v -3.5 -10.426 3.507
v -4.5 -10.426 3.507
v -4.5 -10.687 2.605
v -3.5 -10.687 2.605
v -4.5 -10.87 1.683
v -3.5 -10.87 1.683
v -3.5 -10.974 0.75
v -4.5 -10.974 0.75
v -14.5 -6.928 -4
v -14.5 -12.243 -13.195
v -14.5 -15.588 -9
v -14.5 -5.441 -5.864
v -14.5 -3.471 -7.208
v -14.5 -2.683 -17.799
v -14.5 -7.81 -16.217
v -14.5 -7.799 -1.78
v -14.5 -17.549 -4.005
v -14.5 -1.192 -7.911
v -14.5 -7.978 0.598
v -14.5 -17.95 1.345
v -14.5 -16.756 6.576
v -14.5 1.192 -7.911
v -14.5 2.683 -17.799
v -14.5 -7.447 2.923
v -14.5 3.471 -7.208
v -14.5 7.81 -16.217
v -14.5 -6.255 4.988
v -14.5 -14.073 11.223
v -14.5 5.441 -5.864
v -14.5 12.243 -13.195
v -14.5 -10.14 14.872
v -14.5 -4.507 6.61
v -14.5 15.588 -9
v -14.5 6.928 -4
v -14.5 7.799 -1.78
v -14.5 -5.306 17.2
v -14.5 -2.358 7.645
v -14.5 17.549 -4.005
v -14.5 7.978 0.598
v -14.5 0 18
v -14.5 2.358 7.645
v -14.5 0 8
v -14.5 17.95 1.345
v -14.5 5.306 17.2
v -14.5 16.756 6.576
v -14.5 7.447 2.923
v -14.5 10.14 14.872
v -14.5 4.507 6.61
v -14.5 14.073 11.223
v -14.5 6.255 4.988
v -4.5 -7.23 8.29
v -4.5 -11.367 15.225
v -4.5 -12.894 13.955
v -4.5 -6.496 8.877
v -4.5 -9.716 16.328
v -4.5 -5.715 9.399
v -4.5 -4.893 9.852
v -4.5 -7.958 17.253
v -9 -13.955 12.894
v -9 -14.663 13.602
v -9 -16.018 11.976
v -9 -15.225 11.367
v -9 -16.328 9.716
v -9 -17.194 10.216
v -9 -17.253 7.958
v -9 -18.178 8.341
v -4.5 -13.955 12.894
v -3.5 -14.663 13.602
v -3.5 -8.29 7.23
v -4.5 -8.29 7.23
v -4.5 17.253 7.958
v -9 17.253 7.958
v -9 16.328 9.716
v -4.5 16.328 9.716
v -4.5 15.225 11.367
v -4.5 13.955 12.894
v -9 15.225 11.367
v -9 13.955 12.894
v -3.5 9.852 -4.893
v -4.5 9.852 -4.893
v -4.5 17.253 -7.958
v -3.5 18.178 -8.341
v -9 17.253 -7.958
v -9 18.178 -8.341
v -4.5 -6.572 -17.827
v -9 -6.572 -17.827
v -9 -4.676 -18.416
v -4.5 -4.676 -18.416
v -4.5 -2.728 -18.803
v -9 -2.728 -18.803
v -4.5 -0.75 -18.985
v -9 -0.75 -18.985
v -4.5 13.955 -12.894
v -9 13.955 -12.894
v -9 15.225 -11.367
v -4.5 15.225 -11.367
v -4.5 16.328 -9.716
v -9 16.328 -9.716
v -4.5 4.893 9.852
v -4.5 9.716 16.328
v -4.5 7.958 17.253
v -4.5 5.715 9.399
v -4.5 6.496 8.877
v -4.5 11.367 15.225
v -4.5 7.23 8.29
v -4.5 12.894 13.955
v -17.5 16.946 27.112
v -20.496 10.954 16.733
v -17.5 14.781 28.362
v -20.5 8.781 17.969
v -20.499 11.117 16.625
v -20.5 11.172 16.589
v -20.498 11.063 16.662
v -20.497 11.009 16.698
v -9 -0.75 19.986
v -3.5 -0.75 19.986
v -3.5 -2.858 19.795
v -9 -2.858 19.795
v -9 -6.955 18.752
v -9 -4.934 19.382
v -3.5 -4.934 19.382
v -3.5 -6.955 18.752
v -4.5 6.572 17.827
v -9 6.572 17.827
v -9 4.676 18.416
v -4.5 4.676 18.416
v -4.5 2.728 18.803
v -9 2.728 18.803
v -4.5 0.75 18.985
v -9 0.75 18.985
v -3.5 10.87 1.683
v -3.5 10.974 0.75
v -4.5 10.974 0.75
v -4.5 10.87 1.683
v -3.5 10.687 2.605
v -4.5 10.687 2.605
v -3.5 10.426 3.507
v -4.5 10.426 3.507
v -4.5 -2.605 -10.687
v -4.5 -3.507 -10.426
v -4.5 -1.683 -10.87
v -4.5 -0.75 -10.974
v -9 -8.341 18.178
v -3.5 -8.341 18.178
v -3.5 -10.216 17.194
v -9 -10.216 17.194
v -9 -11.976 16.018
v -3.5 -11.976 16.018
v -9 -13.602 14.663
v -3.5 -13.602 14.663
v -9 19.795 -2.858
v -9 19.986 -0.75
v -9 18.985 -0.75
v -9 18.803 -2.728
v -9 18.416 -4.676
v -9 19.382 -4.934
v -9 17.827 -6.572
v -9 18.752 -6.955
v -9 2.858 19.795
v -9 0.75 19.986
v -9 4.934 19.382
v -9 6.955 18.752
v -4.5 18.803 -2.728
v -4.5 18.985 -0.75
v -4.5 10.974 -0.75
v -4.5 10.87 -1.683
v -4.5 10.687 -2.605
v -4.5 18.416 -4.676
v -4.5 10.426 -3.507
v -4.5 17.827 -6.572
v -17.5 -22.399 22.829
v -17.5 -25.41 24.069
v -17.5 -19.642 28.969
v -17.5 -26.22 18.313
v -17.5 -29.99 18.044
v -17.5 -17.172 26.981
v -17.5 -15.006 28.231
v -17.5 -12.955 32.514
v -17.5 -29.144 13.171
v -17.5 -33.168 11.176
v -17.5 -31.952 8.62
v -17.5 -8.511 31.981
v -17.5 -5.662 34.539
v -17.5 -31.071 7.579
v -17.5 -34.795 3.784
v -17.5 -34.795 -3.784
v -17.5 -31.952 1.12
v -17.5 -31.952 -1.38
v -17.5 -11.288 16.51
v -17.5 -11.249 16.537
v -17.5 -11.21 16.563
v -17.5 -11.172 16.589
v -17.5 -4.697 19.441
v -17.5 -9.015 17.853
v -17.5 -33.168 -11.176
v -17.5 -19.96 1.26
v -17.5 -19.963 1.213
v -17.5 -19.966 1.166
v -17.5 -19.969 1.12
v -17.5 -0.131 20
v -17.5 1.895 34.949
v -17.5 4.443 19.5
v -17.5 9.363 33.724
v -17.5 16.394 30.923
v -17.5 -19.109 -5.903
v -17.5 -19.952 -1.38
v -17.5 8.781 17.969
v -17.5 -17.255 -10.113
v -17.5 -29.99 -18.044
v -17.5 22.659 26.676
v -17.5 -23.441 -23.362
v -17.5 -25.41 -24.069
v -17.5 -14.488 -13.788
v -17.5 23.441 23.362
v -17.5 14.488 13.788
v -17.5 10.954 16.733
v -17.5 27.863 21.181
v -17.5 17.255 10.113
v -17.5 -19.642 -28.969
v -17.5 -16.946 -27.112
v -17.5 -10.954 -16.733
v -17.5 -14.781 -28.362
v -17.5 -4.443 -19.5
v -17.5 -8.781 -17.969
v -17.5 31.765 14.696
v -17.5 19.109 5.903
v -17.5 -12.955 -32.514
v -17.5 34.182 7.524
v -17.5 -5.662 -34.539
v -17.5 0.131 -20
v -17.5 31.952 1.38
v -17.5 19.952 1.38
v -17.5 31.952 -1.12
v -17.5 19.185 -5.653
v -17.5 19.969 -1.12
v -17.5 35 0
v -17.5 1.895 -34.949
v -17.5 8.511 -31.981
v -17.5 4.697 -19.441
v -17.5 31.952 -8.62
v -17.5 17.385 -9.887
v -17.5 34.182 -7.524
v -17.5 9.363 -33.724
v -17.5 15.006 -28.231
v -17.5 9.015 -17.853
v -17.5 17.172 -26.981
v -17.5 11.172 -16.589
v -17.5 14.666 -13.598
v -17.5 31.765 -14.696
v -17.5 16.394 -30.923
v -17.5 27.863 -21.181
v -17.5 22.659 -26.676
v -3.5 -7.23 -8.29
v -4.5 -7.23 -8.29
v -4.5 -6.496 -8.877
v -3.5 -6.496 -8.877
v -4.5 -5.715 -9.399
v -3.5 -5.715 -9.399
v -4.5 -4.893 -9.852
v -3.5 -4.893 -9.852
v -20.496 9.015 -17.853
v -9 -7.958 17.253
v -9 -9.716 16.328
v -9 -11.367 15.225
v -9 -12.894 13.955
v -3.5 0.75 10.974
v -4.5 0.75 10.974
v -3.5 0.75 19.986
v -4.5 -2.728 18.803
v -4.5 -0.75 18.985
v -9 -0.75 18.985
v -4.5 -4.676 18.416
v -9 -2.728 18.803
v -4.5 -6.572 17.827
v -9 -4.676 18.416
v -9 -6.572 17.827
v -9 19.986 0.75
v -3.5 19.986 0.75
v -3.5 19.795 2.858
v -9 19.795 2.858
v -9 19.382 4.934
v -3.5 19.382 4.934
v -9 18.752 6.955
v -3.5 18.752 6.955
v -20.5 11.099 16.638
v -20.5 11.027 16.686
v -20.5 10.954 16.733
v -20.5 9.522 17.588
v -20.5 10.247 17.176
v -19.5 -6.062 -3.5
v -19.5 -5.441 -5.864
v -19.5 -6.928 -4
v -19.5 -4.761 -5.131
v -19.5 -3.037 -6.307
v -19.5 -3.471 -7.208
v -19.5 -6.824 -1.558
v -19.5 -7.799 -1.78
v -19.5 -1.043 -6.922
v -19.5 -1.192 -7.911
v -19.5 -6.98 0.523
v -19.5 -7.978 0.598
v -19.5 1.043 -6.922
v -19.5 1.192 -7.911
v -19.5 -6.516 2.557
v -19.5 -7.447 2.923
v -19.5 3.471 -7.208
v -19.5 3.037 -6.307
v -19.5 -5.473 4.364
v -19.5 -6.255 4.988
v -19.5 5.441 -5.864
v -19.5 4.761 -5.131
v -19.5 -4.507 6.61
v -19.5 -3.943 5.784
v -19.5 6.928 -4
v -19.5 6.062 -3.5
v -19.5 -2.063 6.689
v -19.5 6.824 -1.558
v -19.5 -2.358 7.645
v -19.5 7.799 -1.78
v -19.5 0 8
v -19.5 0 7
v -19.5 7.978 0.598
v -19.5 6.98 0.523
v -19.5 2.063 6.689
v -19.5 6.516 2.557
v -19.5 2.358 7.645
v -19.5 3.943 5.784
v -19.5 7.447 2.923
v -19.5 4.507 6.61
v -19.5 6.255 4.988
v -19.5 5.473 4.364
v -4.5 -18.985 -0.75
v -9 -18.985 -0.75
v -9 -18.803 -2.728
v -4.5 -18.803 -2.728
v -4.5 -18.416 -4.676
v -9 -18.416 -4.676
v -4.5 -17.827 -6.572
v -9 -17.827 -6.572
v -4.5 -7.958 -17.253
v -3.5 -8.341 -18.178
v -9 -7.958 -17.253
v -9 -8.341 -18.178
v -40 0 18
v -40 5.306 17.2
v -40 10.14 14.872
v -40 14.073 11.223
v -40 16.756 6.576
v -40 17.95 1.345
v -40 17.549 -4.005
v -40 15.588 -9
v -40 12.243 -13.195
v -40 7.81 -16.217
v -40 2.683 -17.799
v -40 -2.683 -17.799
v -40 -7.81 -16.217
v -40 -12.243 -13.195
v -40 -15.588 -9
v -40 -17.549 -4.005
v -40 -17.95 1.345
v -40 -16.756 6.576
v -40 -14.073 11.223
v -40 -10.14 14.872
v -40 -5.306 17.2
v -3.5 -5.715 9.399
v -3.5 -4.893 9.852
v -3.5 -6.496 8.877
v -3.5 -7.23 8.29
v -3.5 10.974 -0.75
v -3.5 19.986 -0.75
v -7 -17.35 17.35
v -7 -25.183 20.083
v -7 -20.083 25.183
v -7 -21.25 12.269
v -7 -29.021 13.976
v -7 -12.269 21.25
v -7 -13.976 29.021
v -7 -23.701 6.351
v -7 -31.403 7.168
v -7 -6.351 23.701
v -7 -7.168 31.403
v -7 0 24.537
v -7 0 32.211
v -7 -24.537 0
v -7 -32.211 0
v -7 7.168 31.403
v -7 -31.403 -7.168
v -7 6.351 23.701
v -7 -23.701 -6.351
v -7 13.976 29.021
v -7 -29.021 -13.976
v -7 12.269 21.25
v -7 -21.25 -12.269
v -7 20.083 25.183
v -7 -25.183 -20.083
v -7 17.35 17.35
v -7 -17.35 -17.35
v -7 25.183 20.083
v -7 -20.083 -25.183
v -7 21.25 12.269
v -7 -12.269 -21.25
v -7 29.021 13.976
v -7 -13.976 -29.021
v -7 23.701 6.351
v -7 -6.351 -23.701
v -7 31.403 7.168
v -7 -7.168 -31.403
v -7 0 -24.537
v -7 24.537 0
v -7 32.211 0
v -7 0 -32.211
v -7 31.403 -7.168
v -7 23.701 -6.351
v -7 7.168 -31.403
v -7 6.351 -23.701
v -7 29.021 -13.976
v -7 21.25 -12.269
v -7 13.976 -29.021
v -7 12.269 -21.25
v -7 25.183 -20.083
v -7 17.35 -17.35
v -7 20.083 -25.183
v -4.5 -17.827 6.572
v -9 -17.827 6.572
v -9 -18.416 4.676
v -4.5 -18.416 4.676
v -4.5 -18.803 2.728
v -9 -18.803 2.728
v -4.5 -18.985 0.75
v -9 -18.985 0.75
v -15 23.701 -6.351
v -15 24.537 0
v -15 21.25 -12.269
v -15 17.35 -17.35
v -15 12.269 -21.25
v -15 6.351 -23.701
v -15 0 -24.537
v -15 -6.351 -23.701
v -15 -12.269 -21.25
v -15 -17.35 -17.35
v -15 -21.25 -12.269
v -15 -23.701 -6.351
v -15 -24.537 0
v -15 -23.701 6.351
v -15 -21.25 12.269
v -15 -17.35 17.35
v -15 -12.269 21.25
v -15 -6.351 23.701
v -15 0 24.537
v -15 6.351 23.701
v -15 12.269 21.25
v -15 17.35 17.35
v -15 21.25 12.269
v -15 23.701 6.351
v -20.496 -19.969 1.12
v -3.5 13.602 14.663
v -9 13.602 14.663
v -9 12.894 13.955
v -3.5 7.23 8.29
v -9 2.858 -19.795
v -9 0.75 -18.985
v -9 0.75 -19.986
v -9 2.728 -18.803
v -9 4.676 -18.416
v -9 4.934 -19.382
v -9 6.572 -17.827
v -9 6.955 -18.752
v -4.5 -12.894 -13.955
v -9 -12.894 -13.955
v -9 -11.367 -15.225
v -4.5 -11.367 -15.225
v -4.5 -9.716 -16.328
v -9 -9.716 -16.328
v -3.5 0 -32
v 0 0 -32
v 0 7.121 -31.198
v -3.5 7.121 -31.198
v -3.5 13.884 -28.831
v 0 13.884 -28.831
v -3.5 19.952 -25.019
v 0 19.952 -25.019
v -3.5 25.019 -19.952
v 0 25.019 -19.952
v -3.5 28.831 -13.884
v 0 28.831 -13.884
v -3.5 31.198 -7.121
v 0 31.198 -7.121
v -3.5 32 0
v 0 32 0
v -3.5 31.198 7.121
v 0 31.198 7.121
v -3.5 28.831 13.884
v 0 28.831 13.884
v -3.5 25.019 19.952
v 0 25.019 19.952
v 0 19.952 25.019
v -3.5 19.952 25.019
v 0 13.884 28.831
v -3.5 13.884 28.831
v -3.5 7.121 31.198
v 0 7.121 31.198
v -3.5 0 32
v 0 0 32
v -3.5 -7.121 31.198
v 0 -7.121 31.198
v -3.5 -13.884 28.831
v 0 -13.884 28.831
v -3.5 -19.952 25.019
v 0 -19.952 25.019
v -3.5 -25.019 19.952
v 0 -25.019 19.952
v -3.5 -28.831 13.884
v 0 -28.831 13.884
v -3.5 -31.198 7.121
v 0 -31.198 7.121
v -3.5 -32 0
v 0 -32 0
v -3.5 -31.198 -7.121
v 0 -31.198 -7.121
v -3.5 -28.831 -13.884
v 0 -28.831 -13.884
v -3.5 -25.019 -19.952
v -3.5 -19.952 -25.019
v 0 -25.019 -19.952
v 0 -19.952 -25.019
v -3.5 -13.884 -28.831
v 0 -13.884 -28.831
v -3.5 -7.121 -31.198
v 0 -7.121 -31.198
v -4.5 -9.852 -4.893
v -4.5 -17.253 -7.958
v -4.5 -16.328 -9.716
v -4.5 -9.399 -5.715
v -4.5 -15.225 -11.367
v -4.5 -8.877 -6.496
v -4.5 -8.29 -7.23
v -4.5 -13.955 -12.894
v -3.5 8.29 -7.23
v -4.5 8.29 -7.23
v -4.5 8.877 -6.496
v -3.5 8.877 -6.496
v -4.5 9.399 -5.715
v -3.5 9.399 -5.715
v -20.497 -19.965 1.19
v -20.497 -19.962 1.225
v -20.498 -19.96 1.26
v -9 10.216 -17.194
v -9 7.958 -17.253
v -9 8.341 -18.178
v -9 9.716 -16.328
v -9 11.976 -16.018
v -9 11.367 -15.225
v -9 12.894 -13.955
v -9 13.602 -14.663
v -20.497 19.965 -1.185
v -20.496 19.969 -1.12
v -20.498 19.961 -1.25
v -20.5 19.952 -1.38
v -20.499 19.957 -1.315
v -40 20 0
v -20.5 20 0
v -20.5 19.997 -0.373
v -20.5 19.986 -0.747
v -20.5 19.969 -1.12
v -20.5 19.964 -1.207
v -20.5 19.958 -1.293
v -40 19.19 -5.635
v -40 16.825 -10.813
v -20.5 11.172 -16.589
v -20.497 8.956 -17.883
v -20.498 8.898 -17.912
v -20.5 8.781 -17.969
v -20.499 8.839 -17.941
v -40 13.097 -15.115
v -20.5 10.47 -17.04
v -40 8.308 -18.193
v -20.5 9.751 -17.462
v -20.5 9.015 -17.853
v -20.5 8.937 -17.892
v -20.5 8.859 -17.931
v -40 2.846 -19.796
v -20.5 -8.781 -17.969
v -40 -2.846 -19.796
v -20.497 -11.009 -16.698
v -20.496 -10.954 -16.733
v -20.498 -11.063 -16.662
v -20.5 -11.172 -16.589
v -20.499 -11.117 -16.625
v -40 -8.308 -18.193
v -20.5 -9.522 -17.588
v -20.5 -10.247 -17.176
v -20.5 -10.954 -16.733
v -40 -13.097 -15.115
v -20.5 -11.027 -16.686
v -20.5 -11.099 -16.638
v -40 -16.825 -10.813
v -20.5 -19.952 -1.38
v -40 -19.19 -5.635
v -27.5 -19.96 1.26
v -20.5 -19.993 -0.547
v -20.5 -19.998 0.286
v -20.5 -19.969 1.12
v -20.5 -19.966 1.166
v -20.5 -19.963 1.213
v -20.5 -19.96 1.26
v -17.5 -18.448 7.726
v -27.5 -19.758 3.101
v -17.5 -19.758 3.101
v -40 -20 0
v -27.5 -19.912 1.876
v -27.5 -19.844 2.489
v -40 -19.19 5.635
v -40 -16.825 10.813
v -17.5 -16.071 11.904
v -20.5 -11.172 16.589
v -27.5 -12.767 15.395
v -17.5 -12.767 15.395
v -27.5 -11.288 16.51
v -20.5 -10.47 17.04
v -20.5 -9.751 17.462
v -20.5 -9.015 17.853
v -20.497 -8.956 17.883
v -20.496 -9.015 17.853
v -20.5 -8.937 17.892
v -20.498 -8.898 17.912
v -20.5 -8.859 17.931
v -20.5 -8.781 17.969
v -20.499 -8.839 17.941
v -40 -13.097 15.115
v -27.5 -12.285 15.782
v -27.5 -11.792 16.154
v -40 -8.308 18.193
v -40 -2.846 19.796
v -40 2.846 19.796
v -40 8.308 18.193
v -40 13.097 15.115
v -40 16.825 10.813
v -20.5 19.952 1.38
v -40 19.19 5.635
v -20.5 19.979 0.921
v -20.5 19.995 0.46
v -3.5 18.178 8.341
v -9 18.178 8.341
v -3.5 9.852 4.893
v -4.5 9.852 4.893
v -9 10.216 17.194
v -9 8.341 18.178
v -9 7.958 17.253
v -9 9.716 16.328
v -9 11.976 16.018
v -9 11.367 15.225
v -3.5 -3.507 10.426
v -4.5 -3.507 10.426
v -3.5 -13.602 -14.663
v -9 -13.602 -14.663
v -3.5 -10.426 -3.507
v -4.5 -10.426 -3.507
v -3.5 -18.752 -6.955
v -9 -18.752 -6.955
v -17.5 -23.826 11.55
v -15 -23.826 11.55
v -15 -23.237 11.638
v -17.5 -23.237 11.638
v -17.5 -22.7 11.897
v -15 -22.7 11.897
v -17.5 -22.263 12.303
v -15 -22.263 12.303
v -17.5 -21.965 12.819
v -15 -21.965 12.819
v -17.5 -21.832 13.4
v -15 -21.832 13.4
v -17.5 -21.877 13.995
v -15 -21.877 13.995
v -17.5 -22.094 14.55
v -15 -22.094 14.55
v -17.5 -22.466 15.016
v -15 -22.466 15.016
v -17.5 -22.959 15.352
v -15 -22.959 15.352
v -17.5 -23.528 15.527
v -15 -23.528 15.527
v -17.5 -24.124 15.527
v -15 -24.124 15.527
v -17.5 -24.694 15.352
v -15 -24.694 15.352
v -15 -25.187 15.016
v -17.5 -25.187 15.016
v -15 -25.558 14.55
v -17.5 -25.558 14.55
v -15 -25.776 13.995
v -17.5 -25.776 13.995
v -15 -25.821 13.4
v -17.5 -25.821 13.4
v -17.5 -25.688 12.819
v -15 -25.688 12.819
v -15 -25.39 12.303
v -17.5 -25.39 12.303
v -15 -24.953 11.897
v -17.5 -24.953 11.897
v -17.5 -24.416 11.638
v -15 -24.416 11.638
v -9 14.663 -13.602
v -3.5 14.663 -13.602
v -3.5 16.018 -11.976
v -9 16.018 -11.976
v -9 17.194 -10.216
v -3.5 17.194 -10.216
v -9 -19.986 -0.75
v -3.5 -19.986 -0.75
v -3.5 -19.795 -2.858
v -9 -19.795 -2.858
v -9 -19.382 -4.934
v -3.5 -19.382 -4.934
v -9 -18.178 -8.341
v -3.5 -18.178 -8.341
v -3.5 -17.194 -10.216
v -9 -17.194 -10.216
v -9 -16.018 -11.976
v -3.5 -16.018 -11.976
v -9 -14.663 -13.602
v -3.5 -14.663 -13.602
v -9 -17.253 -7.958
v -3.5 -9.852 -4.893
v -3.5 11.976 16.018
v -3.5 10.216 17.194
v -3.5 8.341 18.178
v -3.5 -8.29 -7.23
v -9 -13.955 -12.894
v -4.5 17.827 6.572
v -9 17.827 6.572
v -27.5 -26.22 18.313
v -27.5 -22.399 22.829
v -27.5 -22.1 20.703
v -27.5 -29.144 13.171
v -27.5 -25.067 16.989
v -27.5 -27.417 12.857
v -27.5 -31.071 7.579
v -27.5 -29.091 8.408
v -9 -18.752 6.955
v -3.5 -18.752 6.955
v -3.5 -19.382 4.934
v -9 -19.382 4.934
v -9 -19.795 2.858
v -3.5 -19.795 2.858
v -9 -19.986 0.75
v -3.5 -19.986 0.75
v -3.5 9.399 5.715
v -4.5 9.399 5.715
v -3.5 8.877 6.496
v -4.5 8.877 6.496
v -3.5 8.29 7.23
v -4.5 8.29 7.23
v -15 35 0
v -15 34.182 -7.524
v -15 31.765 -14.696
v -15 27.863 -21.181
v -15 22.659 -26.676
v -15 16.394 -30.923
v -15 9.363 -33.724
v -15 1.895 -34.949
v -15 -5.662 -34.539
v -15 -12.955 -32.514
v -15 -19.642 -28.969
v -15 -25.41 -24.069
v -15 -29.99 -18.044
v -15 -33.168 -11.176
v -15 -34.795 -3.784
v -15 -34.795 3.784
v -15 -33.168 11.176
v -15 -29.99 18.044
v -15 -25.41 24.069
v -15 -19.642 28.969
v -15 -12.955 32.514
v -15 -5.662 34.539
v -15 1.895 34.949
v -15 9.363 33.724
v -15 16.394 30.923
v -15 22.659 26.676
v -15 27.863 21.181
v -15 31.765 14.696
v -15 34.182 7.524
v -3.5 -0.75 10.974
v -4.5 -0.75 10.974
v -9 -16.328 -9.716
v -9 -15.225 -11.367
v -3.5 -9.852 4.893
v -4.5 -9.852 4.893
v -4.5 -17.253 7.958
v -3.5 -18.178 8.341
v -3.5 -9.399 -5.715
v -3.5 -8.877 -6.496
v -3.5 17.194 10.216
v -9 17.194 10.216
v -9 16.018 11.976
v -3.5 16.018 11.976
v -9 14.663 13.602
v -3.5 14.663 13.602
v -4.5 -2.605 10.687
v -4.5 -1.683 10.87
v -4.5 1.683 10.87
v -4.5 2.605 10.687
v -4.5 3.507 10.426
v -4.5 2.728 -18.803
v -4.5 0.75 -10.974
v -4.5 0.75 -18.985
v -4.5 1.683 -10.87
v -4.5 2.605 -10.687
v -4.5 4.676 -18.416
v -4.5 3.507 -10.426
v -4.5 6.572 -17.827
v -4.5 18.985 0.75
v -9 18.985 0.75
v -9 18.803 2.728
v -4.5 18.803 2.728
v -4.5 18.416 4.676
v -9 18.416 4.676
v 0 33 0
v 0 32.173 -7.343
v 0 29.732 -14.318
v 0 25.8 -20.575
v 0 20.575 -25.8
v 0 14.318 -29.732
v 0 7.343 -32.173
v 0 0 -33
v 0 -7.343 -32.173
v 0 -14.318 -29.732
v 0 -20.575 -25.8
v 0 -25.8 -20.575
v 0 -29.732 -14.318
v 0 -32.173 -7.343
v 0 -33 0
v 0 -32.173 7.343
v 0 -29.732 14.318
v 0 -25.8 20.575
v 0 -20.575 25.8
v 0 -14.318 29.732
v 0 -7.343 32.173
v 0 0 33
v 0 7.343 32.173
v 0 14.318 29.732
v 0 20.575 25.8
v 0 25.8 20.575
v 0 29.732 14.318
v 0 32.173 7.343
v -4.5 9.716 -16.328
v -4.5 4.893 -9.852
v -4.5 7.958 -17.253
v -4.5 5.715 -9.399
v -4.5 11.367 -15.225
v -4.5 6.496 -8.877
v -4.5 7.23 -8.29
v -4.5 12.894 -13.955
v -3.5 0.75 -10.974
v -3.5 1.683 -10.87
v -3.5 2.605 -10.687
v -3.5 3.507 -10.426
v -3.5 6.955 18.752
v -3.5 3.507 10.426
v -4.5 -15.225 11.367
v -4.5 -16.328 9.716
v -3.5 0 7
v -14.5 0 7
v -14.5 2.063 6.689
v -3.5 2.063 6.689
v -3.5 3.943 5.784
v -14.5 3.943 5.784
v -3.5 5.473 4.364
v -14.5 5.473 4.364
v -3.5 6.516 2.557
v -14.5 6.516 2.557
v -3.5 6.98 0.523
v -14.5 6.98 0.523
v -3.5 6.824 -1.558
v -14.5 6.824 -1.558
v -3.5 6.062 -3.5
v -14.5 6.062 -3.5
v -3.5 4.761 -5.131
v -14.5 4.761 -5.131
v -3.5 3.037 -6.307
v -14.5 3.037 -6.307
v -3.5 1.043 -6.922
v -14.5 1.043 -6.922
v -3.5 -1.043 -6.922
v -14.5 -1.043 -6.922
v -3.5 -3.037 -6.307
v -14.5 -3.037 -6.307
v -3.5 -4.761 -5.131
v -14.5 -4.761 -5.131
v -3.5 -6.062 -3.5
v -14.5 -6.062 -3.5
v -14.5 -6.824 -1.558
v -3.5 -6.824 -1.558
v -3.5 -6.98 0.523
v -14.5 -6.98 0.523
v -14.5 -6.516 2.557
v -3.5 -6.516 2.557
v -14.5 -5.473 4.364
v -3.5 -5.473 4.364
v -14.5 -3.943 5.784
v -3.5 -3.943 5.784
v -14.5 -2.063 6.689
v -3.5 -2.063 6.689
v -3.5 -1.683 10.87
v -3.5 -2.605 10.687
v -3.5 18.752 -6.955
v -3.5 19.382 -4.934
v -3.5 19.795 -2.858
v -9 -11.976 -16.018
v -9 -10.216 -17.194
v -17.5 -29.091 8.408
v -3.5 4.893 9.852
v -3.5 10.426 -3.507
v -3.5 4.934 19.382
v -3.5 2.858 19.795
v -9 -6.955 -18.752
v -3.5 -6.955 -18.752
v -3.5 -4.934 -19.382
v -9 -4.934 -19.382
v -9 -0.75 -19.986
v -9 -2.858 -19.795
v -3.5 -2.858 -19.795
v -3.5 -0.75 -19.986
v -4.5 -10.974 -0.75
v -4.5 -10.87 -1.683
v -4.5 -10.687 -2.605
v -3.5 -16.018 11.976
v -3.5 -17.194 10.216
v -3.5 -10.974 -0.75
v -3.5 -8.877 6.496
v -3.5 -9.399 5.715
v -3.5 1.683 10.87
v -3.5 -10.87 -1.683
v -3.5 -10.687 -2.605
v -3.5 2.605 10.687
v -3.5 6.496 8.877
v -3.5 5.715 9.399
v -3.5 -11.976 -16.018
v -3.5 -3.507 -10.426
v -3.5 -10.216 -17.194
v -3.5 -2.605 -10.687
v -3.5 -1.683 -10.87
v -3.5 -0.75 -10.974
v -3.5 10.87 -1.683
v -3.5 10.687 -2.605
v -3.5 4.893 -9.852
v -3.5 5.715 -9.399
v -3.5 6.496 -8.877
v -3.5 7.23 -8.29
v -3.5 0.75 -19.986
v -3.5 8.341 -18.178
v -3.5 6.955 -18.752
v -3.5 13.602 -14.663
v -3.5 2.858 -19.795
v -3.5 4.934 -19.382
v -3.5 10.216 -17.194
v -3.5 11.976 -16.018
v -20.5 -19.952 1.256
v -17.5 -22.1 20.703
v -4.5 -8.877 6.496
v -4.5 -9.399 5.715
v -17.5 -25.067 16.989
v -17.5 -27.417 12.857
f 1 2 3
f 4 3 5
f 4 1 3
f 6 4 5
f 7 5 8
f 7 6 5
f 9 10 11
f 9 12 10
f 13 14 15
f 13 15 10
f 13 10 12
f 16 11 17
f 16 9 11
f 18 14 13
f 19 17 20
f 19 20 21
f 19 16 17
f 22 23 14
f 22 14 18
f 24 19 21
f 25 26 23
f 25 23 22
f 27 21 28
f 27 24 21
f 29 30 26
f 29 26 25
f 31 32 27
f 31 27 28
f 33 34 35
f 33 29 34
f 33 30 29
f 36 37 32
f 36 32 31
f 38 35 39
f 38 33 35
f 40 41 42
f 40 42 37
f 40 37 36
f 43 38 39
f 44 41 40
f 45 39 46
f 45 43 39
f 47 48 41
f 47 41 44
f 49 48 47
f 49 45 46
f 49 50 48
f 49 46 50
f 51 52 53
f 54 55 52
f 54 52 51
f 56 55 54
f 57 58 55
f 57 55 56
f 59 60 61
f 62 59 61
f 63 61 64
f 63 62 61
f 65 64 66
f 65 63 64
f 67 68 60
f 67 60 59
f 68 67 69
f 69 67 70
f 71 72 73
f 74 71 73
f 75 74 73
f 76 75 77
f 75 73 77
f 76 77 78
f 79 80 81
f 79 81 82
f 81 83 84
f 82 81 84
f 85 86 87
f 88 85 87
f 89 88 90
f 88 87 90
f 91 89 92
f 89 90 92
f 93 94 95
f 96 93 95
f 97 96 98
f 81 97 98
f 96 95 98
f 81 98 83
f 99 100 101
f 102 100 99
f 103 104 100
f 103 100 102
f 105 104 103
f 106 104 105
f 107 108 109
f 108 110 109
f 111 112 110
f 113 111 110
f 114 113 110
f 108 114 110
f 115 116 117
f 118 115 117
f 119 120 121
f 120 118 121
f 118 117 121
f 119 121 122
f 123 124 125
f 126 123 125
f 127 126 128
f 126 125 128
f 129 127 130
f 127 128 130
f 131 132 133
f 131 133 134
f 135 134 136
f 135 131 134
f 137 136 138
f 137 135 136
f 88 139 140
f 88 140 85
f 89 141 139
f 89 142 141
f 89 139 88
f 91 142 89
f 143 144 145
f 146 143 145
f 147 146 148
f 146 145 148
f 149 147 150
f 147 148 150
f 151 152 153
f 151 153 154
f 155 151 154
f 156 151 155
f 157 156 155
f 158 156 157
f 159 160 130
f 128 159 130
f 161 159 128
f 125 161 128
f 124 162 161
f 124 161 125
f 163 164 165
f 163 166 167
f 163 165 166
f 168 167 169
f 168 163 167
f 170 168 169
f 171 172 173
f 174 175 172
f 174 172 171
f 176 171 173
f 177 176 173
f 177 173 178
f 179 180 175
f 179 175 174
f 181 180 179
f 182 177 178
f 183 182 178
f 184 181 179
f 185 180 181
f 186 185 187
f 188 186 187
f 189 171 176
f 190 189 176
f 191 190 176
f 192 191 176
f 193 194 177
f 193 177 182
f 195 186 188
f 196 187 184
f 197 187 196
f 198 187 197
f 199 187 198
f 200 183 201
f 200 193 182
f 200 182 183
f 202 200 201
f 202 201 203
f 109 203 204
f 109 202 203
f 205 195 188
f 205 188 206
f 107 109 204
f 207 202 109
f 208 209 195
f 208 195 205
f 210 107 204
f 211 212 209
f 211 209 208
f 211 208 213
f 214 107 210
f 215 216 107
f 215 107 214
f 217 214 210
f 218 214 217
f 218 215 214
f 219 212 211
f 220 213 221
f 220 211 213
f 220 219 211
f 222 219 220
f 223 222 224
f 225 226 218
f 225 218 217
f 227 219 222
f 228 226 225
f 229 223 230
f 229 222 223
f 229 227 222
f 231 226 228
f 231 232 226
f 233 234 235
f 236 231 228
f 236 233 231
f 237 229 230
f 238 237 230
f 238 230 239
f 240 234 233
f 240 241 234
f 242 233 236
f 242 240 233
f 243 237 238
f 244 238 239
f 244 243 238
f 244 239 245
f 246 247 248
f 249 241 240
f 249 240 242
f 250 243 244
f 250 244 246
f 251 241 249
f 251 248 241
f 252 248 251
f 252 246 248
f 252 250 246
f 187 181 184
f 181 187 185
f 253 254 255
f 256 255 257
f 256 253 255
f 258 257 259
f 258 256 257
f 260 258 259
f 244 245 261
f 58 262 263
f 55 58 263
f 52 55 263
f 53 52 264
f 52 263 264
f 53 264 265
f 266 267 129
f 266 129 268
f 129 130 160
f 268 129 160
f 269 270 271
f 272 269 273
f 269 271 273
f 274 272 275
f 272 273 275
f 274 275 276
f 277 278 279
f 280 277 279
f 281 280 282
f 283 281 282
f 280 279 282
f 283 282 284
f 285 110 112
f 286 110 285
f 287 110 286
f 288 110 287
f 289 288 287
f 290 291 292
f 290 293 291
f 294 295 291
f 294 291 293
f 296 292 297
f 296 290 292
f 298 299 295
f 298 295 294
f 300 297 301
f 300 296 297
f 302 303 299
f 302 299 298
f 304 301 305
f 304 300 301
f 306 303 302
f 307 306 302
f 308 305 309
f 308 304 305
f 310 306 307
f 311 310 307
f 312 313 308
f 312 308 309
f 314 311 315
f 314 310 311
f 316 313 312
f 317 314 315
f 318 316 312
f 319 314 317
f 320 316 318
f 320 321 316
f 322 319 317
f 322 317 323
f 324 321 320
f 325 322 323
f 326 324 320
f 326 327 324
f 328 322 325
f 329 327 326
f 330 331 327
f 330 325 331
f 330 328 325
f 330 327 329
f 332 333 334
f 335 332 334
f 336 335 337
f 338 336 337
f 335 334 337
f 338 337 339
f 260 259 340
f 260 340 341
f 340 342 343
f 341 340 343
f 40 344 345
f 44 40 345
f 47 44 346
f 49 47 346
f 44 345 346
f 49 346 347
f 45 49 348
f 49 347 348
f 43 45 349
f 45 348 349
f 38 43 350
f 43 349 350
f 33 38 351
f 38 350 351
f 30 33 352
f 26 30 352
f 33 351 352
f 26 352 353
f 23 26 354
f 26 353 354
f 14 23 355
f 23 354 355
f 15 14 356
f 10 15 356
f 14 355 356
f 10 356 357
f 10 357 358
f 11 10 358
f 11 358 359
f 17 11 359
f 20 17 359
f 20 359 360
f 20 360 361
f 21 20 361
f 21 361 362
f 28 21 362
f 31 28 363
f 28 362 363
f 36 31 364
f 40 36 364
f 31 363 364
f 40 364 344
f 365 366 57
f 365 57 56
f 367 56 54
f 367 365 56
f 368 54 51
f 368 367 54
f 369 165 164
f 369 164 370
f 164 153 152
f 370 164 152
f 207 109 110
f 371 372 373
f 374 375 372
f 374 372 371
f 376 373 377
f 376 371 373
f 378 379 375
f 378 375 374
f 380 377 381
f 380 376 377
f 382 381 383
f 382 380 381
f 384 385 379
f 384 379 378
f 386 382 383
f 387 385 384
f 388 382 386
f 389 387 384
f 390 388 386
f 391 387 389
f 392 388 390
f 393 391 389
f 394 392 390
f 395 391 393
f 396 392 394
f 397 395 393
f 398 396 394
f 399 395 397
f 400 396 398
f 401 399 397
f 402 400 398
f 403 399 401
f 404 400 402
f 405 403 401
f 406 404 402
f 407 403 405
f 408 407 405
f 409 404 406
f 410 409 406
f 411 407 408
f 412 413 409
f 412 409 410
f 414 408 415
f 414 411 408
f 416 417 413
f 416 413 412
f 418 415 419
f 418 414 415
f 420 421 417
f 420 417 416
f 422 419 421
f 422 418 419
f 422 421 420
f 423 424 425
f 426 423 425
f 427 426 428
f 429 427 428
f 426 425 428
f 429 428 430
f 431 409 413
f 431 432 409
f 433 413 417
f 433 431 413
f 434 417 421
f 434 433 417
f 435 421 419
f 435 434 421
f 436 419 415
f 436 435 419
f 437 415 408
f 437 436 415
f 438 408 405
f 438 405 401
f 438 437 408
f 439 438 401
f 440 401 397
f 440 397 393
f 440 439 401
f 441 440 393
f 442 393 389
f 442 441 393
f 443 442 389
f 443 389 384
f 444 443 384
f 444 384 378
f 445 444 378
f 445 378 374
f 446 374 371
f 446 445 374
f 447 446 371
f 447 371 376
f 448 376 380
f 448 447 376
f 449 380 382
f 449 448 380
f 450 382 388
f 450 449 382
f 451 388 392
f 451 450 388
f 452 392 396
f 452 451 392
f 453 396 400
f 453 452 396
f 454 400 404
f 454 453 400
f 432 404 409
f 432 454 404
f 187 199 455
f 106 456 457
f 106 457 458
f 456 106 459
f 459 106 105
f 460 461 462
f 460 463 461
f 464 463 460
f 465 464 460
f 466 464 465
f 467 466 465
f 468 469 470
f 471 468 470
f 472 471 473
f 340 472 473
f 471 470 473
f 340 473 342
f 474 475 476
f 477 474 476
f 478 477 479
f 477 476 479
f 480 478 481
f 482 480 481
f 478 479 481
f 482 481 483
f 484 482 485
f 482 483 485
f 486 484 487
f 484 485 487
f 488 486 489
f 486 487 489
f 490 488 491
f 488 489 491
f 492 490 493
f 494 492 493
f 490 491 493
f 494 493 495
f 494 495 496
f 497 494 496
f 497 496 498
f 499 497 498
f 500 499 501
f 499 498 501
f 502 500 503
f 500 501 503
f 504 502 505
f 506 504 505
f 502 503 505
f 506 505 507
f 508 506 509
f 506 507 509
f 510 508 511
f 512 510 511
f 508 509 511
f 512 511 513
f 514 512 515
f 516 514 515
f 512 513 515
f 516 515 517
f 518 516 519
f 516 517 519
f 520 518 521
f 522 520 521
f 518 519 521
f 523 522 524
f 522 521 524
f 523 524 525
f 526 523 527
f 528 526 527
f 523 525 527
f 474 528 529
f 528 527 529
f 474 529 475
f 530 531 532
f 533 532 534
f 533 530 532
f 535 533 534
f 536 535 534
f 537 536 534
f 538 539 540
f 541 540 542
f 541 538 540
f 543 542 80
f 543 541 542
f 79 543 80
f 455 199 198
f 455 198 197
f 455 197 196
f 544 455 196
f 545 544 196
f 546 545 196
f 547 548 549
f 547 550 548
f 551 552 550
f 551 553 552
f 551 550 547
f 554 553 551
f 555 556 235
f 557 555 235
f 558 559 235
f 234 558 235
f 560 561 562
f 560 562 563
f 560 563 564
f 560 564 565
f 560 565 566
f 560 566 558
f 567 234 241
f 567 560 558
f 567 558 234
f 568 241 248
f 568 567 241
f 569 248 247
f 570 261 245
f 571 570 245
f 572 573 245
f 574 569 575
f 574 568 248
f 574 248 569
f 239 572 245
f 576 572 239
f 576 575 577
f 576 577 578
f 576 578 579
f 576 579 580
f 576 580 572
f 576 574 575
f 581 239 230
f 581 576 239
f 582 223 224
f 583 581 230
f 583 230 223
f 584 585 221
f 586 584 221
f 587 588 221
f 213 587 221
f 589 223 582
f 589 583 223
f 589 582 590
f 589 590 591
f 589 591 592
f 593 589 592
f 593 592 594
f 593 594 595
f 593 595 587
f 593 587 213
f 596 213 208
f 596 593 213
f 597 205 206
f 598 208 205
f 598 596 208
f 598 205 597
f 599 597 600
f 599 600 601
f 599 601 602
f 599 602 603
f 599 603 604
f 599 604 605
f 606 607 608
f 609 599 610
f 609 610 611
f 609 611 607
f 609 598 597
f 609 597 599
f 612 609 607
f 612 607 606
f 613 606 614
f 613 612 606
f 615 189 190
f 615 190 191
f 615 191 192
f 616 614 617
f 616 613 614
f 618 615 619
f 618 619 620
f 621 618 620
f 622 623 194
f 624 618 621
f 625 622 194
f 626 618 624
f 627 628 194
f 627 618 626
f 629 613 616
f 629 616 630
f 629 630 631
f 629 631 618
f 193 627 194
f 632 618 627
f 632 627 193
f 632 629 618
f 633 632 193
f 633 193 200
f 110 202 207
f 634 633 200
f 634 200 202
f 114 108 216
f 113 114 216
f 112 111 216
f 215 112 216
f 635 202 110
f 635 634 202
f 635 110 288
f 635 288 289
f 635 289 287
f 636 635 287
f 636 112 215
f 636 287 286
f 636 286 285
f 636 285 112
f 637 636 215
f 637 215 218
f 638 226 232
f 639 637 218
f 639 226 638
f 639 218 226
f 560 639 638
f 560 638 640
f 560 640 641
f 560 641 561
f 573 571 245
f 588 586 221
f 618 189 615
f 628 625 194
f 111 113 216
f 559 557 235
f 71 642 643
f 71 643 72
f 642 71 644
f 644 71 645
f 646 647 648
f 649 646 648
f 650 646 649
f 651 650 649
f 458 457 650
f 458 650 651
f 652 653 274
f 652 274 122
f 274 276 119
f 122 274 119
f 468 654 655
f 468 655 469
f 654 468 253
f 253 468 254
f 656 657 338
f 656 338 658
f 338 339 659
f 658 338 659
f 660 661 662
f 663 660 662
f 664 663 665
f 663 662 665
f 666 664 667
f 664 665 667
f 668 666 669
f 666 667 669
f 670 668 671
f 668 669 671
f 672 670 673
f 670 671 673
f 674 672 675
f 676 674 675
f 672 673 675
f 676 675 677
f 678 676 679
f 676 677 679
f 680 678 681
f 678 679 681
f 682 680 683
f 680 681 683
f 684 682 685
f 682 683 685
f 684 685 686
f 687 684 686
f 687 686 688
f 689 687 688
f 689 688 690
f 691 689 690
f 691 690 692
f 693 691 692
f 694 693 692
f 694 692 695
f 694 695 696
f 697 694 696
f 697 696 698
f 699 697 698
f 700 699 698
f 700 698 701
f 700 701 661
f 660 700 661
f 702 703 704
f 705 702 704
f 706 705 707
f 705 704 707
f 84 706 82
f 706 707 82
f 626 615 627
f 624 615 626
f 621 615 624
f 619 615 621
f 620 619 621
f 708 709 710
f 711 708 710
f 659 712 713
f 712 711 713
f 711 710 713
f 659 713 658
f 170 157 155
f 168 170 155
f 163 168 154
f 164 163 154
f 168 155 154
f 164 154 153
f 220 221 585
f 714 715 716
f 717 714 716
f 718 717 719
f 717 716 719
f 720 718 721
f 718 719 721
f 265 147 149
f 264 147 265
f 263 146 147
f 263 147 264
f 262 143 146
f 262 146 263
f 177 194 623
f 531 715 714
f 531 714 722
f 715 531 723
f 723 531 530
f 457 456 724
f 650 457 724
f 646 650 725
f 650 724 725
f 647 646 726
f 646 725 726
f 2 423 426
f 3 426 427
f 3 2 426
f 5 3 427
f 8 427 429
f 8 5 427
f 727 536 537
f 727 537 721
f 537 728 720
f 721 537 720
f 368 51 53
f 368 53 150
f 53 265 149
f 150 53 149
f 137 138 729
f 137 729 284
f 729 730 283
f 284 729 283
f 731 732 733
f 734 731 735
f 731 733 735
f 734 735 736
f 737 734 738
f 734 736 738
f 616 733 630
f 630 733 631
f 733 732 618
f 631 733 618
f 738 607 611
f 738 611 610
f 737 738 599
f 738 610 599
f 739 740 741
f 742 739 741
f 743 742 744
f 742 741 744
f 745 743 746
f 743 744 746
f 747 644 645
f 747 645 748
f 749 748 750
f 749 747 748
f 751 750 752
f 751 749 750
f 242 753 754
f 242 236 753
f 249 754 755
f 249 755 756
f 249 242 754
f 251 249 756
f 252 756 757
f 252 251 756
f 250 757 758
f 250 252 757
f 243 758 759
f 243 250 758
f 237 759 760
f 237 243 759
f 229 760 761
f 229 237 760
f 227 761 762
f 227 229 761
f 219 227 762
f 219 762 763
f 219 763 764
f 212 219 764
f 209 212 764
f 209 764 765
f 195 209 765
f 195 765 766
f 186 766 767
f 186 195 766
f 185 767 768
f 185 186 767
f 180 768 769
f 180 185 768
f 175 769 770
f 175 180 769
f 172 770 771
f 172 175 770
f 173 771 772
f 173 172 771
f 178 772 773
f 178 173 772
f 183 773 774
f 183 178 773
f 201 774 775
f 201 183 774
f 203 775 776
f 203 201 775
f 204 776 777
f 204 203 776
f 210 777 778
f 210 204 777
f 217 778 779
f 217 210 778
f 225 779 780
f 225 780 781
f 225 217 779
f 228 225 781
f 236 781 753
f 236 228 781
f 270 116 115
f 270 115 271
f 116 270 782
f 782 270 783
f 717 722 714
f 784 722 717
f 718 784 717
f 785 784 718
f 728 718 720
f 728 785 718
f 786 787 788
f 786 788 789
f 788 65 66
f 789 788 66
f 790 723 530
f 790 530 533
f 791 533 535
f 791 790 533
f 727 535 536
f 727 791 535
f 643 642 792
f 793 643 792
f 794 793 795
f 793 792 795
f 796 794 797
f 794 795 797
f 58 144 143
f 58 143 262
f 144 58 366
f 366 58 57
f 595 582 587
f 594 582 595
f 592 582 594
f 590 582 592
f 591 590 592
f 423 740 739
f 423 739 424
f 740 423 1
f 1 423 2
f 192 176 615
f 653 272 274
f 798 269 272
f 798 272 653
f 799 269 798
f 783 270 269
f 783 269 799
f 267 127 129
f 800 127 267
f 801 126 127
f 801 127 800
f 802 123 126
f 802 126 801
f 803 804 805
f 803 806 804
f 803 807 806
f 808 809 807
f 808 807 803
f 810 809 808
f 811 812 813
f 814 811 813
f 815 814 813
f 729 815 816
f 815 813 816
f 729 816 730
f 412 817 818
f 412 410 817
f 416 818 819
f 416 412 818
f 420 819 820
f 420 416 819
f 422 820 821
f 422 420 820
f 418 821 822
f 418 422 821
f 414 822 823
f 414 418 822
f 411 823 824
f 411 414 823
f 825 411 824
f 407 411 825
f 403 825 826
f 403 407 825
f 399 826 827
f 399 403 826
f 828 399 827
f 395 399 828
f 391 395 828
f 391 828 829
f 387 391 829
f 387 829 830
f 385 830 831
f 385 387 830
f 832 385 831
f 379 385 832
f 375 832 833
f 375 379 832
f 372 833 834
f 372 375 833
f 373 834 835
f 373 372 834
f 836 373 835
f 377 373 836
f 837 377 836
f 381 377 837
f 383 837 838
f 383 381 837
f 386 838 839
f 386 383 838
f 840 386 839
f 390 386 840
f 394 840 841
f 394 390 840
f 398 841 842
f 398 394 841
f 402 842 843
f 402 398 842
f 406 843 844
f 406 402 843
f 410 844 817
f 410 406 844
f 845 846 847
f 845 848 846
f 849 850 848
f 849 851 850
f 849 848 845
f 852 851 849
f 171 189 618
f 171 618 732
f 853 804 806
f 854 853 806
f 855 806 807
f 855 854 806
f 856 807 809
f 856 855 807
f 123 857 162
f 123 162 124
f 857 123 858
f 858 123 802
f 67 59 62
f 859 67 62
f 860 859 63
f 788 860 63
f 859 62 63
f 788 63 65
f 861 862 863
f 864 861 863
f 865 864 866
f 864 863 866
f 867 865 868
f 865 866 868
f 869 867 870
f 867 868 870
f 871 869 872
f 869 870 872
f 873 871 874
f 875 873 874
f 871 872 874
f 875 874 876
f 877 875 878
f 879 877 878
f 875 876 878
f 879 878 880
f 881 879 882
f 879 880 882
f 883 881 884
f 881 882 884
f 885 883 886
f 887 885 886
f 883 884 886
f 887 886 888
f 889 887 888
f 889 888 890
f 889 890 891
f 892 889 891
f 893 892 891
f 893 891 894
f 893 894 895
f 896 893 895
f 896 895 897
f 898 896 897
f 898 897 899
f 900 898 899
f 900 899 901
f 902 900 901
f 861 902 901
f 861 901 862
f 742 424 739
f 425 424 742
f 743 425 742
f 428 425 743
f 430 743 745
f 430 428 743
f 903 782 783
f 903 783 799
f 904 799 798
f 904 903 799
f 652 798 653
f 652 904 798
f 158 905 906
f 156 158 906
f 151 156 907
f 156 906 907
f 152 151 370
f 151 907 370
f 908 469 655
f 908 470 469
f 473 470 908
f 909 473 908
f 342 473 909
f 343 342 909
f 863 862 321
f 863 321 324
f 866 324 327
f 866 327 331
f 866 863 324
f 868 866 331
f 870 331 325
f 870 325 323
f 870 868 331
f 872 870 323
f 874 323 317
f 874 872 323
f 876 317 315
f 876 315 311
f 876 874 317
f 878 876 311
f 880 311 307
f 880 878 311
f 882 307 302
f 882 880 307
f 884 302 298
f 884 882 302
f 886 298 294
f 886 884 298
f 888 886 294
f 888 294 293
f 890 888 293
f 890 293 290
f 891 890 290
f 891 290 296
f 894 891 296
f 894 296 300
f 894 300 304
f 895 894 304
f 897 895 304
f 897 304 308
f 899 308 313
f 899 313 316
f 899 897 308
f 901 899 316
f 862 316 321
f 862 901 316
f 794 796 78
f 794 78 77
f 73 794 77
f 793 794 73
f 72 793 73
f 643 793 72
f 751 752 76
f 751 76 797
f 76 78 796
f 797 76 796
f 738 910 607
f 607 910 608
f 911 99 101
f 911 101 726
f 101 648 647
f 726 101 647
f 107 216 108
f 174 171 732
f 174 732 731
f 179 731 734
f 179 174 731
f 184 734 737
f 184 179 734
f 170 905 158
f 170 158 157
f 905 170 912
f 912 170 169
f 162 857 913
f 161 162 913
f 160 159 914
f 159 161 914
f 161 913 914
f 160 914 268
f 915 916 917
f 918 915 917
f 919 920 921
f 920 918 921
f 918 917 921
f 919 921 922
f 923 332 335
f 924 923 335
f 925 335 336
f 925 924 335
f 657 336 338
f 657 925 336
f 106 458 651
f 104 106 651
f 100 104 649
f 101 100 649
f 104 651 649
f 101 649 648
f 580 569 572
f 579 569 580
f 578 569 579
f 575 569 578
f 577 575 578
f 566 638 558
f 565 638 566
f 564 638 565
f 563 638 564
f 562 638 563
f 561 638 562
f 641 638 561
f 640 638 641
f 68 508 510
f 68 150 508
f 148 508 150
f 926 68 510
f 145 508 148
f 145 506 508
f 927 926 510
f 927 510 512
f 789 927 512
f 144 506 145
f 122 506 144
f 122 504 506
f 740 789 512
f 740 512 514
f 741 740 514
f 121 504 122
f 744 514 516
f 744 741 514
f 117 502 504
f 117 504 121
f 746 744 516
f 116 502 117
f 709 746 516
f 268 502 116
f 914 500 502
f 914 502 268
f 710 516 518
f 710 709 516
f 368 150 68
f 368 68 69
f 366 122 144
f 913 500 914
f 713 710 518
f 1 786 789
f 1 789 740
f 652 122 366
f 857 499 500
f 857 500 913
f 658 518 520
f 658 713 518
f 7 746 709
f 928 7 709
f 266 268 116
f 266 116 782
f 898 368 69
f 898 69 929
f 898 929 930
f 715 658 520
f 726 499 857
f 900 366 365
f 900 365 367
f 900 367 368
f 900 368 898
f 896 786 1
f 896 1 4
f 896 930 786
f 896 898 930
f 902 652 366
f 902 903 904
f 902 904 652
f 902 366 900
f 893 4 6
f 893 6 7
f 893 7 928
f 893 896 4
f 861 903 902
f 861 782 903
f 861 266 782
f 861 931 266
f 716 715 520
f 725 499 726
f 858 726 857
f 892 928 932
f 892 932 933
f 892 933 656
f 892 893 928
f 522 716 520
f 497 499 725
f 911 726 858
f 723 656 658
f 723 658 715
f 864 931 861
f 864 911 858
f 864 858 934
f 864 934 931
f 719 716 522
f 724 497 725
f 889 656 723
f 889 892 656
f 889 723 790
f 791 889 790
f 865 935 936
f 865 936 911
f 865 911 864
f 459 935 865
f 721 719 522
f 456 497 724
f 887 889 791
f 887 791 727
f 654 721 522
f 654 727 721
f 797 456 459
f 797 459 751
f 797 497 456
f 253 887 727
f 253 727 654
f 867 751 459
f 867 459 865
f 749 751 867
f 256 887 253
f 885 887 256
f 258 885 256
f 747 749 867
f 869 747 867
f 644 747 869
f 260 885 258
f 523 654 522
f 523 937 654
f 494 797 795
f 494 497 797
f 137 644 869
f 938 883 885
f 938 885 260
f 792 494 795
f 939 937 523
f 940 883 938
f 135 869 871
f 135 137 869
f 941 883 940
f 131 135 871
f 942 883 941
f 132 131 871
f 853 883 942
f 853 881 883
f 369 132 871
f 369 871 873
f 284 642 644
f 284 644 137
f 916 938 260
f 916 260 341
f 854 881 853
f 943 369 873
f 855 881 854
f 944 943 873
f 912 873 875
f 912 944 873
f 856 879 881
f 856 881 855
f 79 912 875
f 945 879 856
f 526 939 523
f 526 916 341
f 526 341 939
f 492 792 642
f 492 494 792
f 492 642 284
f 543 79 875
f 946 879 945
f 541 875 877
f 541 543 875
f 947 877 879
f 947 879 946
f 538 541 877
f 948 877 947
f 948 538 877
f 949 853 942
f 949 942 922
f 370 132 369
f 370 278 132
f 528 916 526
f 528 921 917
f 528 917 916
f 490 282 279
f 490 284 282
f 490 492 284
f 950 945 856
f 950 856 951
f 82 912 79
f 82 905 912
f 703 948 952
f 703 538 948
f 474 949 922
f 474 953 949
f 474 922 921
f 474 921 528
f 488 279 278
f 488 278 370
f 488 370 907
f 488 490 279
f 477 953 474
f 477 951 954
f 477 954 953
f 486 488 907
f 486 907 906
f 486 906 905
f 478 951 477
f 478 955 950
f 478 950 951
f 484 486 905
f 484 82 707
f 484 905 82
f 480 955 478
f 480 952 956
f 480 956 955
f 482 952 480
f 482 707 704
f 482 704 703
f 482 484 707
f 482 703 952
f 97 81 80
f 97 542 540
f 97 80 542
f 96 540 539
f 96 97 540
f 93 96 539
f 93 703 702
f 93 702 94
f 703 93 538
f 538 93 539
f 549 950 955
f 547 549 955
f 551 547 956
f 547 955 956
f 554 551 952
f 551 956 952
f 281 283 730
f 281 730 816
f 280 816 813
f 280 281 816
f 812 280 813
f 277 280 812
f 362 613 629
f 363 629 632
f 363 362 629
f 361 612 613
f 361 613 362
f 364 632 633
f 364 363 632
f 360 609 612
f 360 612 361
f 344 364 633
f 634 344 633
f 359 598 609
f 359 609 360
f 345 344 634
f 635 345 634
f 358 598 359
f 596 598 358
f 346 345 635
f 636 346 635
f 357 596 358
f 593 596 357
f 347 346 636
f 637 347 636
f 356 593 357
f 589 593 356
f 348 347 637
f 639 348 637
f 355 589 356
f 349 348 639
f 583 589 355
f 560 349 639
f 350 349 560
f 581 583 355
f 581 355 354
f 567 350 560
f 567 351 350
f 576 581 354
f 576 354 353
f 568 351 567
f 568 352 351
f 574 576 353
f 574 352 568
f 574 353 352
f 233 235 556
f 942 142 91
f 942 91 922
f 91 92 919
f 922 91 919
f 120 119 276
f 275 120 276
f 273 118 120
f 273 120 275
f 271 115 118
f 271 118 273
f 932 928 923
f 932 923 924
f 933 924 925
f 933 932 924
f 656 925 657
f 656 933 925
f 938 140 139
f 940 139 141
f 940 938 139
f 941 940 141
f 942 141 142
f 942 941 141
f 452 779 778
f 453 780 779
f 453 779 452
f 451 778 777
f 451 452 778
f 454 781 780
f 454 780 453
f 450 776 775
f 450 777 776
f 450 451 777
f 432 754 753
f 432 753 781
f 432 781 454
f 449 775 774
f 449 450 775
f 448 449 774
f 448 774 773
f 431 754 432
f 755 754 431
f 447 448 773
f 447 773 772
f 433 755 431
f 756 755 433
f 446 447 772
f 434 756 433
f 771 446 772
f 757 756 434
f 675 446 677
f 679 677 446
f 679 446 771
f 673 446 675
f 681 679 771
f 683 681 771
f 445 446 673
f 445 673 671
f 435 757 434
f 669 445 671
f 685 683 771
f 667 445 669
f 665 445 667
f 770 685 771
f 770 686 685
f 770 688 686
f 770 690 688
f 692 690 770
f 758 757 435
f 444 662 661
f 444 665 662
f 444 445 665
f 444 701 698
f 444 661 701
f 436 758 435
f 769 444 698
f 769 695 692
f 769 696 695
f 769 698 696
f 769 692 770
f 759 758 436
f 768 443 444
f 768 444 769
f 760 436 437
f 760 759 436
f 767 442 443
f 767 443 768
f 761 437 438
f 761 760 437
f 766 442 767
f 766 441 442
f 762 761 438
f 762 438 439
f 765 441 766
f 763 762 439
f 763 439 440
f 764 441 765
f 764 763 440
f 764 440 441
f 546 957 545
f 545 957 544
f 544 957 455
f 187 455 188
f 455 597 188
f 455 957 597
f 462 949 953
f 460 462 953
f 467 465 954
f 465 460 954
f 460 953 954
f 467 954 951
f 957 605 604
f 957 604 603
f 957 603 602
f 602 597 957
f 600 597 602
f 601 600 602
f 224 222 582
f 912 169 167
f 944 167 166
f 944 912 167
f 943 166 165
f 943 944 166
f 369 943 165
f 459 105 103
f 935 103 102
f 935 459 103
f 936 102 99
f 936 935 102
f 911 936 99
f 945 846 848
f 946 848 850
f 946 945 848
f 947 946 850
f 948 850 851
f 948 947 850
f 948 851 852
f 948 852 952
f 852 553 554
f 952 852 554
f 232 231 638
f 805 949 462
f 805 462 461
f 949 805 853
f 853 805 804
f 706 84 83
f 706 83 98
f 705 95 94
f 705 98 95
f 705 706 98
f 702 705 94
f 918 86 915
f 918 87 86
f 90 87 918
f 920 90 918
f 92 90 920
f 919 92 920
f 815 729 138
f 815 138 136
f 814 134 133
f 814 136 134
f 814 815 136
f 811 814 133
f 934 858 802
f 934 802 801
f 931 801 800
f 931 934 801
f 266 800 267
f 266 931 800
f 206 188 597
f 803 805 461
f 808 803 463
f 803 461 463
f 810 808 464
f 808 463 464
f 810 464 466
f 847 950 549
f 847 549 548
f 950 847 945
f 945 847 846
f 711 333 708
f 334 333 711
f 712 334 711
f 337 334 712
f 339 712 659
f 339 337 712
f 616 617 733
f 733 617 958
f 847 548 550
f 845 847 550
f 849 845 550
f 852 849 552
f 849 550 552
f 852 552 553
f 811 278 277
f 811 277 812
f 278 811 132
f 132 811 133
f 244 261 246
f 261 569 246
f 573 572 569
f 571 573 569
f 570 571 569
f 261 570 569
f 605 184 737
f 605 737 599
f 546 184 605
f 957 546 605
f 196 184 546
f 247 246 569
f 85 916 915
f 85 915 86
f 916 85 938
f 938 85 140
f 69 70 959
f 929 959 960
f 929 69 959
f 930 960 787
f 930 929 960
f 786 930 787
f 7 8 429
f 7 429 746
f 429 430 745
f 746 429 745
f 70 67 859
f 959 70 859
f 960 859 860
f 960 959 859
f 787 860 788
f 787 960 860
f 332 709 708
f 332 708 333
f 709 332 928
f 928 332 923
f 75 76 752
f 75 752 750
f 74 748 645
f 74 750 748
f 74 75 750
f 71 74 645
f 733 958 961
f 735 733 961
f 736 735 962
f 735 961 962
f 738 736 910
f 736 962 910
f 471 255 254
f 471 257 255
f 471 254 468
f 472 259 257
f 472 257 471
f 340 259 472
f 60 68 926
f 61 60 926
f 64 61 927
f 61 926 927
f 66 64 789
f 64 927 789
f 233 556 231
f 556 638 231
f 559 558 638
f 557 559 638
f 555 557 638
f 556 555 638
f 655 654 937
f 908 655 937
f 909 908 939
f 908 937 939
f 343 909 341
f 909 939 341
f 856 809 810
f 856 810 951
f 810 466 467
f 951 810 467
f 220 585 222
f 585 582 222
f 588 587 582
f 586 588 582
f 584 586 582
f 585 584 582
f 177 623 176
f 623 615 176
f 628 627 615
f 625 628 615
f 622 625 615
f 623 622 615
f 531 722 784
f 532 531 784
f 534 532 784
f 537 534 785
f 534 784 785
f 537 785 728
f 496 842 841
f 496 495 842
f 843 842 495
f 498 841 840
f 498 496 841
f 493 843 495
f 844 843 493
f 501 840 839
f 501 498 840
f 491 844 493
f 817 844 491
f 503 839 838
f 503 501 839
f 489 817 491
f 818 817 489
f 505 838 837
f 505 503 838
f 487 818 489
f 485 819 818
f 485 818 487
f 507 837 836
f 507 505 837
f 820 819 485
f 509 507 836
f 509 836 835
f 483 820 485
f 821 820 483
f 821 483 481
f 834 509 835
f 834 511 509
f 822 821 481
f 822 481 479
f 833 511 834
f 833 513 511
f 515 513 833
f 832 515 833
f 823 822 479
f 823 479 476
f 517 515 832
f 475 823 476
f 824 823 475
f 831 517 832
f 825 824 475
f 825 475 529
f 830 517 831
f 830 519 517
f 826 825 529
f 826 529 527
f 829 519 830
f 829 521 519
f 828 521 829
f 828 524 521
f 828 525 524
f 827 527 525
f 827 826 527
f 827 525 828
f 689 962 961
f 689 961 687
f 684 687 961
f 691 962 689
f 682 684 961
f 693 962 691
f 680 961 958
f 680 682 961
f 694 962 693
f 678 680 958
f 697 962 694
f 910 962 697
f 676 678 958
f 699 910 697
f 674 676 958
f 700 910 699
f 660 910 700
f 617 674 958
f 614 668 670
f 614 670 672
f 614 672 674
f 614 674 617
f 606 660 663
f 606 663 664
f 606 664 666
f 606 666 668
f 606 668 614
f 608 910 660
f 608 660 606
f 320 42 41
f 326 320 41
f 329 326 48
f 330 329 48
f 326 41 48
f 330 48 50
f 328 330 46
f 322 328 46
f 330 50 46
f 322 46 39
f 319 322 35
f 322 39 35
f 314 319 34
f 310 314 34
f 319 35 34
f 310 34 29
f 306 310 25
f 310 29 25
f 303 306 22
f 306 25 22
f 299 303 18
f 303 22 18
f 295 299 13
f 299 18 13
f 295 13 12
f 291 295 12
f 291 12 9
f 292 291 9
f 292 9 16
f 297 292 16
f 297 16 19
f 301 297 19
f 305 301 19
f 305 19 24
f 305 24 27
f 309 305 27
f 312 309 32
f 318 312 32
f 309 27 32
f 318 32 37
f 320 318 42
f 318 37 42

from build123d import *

# Parameters (mm, degrees)
BOSS_EXTRUDE1_DEPTH = 3
CUT_EXTRUDE1_DEPTH  = 10
CIRPATTERN1_COUNT   = 6
BOSS_EXTRUDE2_DEPTH = 10
SKETCH6_R           = 32
CUT_EXTRUDE2_DEPTH  = 3.5
SKETCH7_R           = 20
SKETCH7_R_2         = 11
CUT_EXTRUDE4_DEPTH  = 5.5
BOSS_EXTRUDE3_DEPTH = 5.5
CIRPATTERN2_COUNT   = 16
SKETCH10_R          = 19
BOSS_EXTRUDE4_DEPTH = 4.5
SKETCH11_R          = 18
CUT_EXTRUDE5_DEPTH  = 25.5
SKETCH12_R          = 8
SKETCH12_R_2        = 7
BOSS_EXTRUDE5_DEPTH = 5
SKETCH13_R          = 7
CUT_EXTRUDE6_DEPTH  = 23
SKETCH14_R          = 2
CUT_EXTRUDE9_DEPTH  = 6


with BuildPart() as part:
    # Sketch2 → Revolve2 (revolve)
    with BuildSketch(Plane.XY):
        Polygon((0, 0), (0, 33), (-7, 32.210806874), (-7, 24.5371762), (-15, 24.5371762), (-15, 35), (-17.5, 35), (-17.5, 20), (-40, 20), (-40, 0), align=None)
    revolve(axis=Axis((0, 0, 0), (-1, 0, 0)))

    # Sketch3 → Boss-Extrude1 (add)
    with BuildSketch(Plane.ZY.offset(17.5)):
        with BuildLine():
            Line((-1.119688757, 19.96863283), (-1.119688757, 31.952311667))
            Line((-1.119688757, 31.952311667), (1.380311243, 31.952311667))
            Line((1.380311243, 31.952311667), (1.380311243, 19.952311667))
            ThreePointArc((1.380311243, 19.952311667), (0.130566516, 19.999573805), (-1.119688757, 19.96863283))
        make_face()
    boss_extrude1 = extrude(amount=BOSS_EXTRUDE1_DEPTH)

    # Sketch4 → Cut-Extrude1 (cut)
    with BuildSketch(Plane.XY.offset(1.380311243)):
        Polygon((-20.5, 19.952311667), (-17.5, 31.952311667), (-20.5, 31.952311667), align=None)
    cut_extrude1 = extrude(amount=-CUT_EXTRUDE1_DEPTH, mode=Mode.SUBTRACT)

    # CirPattern1: Boss-Extrude1, Cut-Extrude1 ×6 about axis
    cirpattern1_axis = Axis((0, 0, 0), (1, 0, 0))
    for i in range(1, CIRPATTERN1_COUNT):
        add(boss_extrude1.rotate(cirpattern1_axis, i * 360 / CIRPATTERN1_COUNT))
        add(cut_extrude1.rotate(cirpattern1_axis, i * 360 / CIRPATTERN1_COUNT), mode=Mode.SUBTRACT)

    # Sketch5 → Boss-Extrude2 (add)
    with BuildSketch(Plane.ZY.offset(17.5)):
        with BuildLine():
            Line((0.341434911, -18.344937093), (15.591504627, -9.672552828))
            Line((15.591504627, -9.672552828), (22.828663164, -22.398830732))
            ThreePointArc((22.828663164, -22.398830732), (15.809898035, -27.801125951), (7.578593448, -31.071214997))
            Line((7.578593448, -31.071214997), (0.341434911, -18.344937093))
        make_face()
        with BuildLine():
            Line((2.659566405, -18.98232738), (14.95411434, -11.990684322))
            Line((14.95411434, -11.990684322), (20.702890868, -22.099697042))
            ThreePointArc((20.702890868, -22.099697042), (14.969527432, -26.323365061), (8.408342933, -29.091340099))
            Line((8.408342933, -29.091340099), (2.659566405, -18.98232738))
        make_face(mode=Mode.SUBTRACT)
    extrude(amount=BOSS_EXTRUDE2_DEPTH)

    # Sketch6 → Cut-Extrude2 (cut)
    with BuildSketch(Plane(origin=(0, 0, 0), x_dir=(0, 0, -1), z_dir=(1, 0, 0))):
        Circle(SKETCH6_R)
    extrude(amount=-CUT_EXTRUDE2_DEPTH, mode=Mode.SUBTRACT)

    # Sketch7 → Cut-Extrude4 (cut)
    with BuildSketch(Plane(origin=(-3.5, 0, 0), x_dir=(0, 0, -1), z_dir=(1, 0, 0))):
        Circle(SKETCH7_R)
        Circle(SKETCH7_R_2, mode=Mode.SUBTRACT)
    extrude(amount=-CUT_EXTRUDE4_DEPTH, mode=Mode.SUBTRACT)

    # Sketch9 → Boss-Extrude3 (add)
    with BuildSketch(Plane(origin=(-9, 0, 0), x_dir=(0, 0, -1), z_dir=(1, 0, 0))):
        with BuildLine():
            Line((0.75, 10.60425024), (0.75, 20.365350298))
            ThreePointArc((0.75, 20.365350298), (0, 20.37915584), (-0.75, 20.365350298))
            Line((-0.75, 20.365350298), (-0.75, 10.60425024))
            ThreePointArc((-0.75, 10.60425024), (0, 10.630739539), (0.75, 10.60425024))
        make_face()
    boss_extrude3 = extrude(amount=BOSS_EXTRUDE3_DEPTH)

    # CirPattern2: Boss-Extrude3 ×16 about axis
    cirpattern2_axis = Axis((0, 0, 0), (1, 0, 0))
    for i in range(1, CIRPATTERN2_COUNT):
        add(boss_extrude3.rotate(cirpattern2_axis, i * 360 / CIRPATTERN2_COUNT))

    # Sketch10 → Boss-Extrude4 (add)
    with BuildSketch(Plane(origin=(-9, 0, 0), x_dir=(0, 0, -1), z_dir=(1, 0, 0))):
        Circle(SKETCH10_R)
    extrude(amount=BOSS_EXTRUDE4_DEPTH)

    # Sketch11 → Cut-Extrude5 (cut)
    with BuildSketch(Plane.ZY.offset(40)):
        Circle(SKETCH11_R)
    extrude(amount=-CUT_EXTRUDE5_DEPTH, mode=Mode.SUBTRACT)

    # Sketch12 → Boss-Extrude5 (add)
    with BuildSketch(Plane.ZY.offset(14.5)):
        Circle(SKETCH12_R)
        Circle(SKETCH12_R_2, mode=Mode.SUBTRACT)
    extrude(amount=BOSS_EXTRUDE5_DEPTH)

    # Sketch13 → Cut-Extrude6 (cut)
    with BuildSketch(Plane.ZY.offset(14.5)):
        Circle(SKETCH13_R)
    extrude(amount=-CUT_EXTRUDE6_DEPTH, mode=Mode.SUBTRACT)

    # Sketch14 → Cut-Extrude9 (cut)
    with BuildSketch(Plane(origin=(-15, 0, 0), x_dir=(0, 0, -1), z_dir=(1, 0, 0))):
        with Locations((-13.549564178, -23.82641175)):
            Circle(SKETCH14_R)
    extrude(amount=-CUT_EXTRUDE9_DEPTH, mode=Mode.SUBTRACT)


solid = part.part
